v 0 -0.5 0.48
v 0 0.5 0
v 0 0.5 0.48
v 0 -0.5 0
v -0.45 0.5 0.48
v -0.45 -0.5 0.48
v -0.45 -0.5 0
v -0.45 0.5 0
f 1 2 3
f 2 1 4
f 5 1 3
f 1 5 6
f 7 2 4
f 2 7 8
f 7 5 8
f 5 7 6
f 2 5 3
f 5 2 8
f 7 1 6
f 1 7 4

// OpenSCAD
bodyDims=[3.2,1.0,0.48]; //including pads
capWidth=0.45;
filRad=0.25;

translate([-capWidth/2,0,bodyDims.z/2]) difference(){
  cube([capWidth,bodyDims.y,bodyDims.z],true);
  circle(filRad);
}

  
